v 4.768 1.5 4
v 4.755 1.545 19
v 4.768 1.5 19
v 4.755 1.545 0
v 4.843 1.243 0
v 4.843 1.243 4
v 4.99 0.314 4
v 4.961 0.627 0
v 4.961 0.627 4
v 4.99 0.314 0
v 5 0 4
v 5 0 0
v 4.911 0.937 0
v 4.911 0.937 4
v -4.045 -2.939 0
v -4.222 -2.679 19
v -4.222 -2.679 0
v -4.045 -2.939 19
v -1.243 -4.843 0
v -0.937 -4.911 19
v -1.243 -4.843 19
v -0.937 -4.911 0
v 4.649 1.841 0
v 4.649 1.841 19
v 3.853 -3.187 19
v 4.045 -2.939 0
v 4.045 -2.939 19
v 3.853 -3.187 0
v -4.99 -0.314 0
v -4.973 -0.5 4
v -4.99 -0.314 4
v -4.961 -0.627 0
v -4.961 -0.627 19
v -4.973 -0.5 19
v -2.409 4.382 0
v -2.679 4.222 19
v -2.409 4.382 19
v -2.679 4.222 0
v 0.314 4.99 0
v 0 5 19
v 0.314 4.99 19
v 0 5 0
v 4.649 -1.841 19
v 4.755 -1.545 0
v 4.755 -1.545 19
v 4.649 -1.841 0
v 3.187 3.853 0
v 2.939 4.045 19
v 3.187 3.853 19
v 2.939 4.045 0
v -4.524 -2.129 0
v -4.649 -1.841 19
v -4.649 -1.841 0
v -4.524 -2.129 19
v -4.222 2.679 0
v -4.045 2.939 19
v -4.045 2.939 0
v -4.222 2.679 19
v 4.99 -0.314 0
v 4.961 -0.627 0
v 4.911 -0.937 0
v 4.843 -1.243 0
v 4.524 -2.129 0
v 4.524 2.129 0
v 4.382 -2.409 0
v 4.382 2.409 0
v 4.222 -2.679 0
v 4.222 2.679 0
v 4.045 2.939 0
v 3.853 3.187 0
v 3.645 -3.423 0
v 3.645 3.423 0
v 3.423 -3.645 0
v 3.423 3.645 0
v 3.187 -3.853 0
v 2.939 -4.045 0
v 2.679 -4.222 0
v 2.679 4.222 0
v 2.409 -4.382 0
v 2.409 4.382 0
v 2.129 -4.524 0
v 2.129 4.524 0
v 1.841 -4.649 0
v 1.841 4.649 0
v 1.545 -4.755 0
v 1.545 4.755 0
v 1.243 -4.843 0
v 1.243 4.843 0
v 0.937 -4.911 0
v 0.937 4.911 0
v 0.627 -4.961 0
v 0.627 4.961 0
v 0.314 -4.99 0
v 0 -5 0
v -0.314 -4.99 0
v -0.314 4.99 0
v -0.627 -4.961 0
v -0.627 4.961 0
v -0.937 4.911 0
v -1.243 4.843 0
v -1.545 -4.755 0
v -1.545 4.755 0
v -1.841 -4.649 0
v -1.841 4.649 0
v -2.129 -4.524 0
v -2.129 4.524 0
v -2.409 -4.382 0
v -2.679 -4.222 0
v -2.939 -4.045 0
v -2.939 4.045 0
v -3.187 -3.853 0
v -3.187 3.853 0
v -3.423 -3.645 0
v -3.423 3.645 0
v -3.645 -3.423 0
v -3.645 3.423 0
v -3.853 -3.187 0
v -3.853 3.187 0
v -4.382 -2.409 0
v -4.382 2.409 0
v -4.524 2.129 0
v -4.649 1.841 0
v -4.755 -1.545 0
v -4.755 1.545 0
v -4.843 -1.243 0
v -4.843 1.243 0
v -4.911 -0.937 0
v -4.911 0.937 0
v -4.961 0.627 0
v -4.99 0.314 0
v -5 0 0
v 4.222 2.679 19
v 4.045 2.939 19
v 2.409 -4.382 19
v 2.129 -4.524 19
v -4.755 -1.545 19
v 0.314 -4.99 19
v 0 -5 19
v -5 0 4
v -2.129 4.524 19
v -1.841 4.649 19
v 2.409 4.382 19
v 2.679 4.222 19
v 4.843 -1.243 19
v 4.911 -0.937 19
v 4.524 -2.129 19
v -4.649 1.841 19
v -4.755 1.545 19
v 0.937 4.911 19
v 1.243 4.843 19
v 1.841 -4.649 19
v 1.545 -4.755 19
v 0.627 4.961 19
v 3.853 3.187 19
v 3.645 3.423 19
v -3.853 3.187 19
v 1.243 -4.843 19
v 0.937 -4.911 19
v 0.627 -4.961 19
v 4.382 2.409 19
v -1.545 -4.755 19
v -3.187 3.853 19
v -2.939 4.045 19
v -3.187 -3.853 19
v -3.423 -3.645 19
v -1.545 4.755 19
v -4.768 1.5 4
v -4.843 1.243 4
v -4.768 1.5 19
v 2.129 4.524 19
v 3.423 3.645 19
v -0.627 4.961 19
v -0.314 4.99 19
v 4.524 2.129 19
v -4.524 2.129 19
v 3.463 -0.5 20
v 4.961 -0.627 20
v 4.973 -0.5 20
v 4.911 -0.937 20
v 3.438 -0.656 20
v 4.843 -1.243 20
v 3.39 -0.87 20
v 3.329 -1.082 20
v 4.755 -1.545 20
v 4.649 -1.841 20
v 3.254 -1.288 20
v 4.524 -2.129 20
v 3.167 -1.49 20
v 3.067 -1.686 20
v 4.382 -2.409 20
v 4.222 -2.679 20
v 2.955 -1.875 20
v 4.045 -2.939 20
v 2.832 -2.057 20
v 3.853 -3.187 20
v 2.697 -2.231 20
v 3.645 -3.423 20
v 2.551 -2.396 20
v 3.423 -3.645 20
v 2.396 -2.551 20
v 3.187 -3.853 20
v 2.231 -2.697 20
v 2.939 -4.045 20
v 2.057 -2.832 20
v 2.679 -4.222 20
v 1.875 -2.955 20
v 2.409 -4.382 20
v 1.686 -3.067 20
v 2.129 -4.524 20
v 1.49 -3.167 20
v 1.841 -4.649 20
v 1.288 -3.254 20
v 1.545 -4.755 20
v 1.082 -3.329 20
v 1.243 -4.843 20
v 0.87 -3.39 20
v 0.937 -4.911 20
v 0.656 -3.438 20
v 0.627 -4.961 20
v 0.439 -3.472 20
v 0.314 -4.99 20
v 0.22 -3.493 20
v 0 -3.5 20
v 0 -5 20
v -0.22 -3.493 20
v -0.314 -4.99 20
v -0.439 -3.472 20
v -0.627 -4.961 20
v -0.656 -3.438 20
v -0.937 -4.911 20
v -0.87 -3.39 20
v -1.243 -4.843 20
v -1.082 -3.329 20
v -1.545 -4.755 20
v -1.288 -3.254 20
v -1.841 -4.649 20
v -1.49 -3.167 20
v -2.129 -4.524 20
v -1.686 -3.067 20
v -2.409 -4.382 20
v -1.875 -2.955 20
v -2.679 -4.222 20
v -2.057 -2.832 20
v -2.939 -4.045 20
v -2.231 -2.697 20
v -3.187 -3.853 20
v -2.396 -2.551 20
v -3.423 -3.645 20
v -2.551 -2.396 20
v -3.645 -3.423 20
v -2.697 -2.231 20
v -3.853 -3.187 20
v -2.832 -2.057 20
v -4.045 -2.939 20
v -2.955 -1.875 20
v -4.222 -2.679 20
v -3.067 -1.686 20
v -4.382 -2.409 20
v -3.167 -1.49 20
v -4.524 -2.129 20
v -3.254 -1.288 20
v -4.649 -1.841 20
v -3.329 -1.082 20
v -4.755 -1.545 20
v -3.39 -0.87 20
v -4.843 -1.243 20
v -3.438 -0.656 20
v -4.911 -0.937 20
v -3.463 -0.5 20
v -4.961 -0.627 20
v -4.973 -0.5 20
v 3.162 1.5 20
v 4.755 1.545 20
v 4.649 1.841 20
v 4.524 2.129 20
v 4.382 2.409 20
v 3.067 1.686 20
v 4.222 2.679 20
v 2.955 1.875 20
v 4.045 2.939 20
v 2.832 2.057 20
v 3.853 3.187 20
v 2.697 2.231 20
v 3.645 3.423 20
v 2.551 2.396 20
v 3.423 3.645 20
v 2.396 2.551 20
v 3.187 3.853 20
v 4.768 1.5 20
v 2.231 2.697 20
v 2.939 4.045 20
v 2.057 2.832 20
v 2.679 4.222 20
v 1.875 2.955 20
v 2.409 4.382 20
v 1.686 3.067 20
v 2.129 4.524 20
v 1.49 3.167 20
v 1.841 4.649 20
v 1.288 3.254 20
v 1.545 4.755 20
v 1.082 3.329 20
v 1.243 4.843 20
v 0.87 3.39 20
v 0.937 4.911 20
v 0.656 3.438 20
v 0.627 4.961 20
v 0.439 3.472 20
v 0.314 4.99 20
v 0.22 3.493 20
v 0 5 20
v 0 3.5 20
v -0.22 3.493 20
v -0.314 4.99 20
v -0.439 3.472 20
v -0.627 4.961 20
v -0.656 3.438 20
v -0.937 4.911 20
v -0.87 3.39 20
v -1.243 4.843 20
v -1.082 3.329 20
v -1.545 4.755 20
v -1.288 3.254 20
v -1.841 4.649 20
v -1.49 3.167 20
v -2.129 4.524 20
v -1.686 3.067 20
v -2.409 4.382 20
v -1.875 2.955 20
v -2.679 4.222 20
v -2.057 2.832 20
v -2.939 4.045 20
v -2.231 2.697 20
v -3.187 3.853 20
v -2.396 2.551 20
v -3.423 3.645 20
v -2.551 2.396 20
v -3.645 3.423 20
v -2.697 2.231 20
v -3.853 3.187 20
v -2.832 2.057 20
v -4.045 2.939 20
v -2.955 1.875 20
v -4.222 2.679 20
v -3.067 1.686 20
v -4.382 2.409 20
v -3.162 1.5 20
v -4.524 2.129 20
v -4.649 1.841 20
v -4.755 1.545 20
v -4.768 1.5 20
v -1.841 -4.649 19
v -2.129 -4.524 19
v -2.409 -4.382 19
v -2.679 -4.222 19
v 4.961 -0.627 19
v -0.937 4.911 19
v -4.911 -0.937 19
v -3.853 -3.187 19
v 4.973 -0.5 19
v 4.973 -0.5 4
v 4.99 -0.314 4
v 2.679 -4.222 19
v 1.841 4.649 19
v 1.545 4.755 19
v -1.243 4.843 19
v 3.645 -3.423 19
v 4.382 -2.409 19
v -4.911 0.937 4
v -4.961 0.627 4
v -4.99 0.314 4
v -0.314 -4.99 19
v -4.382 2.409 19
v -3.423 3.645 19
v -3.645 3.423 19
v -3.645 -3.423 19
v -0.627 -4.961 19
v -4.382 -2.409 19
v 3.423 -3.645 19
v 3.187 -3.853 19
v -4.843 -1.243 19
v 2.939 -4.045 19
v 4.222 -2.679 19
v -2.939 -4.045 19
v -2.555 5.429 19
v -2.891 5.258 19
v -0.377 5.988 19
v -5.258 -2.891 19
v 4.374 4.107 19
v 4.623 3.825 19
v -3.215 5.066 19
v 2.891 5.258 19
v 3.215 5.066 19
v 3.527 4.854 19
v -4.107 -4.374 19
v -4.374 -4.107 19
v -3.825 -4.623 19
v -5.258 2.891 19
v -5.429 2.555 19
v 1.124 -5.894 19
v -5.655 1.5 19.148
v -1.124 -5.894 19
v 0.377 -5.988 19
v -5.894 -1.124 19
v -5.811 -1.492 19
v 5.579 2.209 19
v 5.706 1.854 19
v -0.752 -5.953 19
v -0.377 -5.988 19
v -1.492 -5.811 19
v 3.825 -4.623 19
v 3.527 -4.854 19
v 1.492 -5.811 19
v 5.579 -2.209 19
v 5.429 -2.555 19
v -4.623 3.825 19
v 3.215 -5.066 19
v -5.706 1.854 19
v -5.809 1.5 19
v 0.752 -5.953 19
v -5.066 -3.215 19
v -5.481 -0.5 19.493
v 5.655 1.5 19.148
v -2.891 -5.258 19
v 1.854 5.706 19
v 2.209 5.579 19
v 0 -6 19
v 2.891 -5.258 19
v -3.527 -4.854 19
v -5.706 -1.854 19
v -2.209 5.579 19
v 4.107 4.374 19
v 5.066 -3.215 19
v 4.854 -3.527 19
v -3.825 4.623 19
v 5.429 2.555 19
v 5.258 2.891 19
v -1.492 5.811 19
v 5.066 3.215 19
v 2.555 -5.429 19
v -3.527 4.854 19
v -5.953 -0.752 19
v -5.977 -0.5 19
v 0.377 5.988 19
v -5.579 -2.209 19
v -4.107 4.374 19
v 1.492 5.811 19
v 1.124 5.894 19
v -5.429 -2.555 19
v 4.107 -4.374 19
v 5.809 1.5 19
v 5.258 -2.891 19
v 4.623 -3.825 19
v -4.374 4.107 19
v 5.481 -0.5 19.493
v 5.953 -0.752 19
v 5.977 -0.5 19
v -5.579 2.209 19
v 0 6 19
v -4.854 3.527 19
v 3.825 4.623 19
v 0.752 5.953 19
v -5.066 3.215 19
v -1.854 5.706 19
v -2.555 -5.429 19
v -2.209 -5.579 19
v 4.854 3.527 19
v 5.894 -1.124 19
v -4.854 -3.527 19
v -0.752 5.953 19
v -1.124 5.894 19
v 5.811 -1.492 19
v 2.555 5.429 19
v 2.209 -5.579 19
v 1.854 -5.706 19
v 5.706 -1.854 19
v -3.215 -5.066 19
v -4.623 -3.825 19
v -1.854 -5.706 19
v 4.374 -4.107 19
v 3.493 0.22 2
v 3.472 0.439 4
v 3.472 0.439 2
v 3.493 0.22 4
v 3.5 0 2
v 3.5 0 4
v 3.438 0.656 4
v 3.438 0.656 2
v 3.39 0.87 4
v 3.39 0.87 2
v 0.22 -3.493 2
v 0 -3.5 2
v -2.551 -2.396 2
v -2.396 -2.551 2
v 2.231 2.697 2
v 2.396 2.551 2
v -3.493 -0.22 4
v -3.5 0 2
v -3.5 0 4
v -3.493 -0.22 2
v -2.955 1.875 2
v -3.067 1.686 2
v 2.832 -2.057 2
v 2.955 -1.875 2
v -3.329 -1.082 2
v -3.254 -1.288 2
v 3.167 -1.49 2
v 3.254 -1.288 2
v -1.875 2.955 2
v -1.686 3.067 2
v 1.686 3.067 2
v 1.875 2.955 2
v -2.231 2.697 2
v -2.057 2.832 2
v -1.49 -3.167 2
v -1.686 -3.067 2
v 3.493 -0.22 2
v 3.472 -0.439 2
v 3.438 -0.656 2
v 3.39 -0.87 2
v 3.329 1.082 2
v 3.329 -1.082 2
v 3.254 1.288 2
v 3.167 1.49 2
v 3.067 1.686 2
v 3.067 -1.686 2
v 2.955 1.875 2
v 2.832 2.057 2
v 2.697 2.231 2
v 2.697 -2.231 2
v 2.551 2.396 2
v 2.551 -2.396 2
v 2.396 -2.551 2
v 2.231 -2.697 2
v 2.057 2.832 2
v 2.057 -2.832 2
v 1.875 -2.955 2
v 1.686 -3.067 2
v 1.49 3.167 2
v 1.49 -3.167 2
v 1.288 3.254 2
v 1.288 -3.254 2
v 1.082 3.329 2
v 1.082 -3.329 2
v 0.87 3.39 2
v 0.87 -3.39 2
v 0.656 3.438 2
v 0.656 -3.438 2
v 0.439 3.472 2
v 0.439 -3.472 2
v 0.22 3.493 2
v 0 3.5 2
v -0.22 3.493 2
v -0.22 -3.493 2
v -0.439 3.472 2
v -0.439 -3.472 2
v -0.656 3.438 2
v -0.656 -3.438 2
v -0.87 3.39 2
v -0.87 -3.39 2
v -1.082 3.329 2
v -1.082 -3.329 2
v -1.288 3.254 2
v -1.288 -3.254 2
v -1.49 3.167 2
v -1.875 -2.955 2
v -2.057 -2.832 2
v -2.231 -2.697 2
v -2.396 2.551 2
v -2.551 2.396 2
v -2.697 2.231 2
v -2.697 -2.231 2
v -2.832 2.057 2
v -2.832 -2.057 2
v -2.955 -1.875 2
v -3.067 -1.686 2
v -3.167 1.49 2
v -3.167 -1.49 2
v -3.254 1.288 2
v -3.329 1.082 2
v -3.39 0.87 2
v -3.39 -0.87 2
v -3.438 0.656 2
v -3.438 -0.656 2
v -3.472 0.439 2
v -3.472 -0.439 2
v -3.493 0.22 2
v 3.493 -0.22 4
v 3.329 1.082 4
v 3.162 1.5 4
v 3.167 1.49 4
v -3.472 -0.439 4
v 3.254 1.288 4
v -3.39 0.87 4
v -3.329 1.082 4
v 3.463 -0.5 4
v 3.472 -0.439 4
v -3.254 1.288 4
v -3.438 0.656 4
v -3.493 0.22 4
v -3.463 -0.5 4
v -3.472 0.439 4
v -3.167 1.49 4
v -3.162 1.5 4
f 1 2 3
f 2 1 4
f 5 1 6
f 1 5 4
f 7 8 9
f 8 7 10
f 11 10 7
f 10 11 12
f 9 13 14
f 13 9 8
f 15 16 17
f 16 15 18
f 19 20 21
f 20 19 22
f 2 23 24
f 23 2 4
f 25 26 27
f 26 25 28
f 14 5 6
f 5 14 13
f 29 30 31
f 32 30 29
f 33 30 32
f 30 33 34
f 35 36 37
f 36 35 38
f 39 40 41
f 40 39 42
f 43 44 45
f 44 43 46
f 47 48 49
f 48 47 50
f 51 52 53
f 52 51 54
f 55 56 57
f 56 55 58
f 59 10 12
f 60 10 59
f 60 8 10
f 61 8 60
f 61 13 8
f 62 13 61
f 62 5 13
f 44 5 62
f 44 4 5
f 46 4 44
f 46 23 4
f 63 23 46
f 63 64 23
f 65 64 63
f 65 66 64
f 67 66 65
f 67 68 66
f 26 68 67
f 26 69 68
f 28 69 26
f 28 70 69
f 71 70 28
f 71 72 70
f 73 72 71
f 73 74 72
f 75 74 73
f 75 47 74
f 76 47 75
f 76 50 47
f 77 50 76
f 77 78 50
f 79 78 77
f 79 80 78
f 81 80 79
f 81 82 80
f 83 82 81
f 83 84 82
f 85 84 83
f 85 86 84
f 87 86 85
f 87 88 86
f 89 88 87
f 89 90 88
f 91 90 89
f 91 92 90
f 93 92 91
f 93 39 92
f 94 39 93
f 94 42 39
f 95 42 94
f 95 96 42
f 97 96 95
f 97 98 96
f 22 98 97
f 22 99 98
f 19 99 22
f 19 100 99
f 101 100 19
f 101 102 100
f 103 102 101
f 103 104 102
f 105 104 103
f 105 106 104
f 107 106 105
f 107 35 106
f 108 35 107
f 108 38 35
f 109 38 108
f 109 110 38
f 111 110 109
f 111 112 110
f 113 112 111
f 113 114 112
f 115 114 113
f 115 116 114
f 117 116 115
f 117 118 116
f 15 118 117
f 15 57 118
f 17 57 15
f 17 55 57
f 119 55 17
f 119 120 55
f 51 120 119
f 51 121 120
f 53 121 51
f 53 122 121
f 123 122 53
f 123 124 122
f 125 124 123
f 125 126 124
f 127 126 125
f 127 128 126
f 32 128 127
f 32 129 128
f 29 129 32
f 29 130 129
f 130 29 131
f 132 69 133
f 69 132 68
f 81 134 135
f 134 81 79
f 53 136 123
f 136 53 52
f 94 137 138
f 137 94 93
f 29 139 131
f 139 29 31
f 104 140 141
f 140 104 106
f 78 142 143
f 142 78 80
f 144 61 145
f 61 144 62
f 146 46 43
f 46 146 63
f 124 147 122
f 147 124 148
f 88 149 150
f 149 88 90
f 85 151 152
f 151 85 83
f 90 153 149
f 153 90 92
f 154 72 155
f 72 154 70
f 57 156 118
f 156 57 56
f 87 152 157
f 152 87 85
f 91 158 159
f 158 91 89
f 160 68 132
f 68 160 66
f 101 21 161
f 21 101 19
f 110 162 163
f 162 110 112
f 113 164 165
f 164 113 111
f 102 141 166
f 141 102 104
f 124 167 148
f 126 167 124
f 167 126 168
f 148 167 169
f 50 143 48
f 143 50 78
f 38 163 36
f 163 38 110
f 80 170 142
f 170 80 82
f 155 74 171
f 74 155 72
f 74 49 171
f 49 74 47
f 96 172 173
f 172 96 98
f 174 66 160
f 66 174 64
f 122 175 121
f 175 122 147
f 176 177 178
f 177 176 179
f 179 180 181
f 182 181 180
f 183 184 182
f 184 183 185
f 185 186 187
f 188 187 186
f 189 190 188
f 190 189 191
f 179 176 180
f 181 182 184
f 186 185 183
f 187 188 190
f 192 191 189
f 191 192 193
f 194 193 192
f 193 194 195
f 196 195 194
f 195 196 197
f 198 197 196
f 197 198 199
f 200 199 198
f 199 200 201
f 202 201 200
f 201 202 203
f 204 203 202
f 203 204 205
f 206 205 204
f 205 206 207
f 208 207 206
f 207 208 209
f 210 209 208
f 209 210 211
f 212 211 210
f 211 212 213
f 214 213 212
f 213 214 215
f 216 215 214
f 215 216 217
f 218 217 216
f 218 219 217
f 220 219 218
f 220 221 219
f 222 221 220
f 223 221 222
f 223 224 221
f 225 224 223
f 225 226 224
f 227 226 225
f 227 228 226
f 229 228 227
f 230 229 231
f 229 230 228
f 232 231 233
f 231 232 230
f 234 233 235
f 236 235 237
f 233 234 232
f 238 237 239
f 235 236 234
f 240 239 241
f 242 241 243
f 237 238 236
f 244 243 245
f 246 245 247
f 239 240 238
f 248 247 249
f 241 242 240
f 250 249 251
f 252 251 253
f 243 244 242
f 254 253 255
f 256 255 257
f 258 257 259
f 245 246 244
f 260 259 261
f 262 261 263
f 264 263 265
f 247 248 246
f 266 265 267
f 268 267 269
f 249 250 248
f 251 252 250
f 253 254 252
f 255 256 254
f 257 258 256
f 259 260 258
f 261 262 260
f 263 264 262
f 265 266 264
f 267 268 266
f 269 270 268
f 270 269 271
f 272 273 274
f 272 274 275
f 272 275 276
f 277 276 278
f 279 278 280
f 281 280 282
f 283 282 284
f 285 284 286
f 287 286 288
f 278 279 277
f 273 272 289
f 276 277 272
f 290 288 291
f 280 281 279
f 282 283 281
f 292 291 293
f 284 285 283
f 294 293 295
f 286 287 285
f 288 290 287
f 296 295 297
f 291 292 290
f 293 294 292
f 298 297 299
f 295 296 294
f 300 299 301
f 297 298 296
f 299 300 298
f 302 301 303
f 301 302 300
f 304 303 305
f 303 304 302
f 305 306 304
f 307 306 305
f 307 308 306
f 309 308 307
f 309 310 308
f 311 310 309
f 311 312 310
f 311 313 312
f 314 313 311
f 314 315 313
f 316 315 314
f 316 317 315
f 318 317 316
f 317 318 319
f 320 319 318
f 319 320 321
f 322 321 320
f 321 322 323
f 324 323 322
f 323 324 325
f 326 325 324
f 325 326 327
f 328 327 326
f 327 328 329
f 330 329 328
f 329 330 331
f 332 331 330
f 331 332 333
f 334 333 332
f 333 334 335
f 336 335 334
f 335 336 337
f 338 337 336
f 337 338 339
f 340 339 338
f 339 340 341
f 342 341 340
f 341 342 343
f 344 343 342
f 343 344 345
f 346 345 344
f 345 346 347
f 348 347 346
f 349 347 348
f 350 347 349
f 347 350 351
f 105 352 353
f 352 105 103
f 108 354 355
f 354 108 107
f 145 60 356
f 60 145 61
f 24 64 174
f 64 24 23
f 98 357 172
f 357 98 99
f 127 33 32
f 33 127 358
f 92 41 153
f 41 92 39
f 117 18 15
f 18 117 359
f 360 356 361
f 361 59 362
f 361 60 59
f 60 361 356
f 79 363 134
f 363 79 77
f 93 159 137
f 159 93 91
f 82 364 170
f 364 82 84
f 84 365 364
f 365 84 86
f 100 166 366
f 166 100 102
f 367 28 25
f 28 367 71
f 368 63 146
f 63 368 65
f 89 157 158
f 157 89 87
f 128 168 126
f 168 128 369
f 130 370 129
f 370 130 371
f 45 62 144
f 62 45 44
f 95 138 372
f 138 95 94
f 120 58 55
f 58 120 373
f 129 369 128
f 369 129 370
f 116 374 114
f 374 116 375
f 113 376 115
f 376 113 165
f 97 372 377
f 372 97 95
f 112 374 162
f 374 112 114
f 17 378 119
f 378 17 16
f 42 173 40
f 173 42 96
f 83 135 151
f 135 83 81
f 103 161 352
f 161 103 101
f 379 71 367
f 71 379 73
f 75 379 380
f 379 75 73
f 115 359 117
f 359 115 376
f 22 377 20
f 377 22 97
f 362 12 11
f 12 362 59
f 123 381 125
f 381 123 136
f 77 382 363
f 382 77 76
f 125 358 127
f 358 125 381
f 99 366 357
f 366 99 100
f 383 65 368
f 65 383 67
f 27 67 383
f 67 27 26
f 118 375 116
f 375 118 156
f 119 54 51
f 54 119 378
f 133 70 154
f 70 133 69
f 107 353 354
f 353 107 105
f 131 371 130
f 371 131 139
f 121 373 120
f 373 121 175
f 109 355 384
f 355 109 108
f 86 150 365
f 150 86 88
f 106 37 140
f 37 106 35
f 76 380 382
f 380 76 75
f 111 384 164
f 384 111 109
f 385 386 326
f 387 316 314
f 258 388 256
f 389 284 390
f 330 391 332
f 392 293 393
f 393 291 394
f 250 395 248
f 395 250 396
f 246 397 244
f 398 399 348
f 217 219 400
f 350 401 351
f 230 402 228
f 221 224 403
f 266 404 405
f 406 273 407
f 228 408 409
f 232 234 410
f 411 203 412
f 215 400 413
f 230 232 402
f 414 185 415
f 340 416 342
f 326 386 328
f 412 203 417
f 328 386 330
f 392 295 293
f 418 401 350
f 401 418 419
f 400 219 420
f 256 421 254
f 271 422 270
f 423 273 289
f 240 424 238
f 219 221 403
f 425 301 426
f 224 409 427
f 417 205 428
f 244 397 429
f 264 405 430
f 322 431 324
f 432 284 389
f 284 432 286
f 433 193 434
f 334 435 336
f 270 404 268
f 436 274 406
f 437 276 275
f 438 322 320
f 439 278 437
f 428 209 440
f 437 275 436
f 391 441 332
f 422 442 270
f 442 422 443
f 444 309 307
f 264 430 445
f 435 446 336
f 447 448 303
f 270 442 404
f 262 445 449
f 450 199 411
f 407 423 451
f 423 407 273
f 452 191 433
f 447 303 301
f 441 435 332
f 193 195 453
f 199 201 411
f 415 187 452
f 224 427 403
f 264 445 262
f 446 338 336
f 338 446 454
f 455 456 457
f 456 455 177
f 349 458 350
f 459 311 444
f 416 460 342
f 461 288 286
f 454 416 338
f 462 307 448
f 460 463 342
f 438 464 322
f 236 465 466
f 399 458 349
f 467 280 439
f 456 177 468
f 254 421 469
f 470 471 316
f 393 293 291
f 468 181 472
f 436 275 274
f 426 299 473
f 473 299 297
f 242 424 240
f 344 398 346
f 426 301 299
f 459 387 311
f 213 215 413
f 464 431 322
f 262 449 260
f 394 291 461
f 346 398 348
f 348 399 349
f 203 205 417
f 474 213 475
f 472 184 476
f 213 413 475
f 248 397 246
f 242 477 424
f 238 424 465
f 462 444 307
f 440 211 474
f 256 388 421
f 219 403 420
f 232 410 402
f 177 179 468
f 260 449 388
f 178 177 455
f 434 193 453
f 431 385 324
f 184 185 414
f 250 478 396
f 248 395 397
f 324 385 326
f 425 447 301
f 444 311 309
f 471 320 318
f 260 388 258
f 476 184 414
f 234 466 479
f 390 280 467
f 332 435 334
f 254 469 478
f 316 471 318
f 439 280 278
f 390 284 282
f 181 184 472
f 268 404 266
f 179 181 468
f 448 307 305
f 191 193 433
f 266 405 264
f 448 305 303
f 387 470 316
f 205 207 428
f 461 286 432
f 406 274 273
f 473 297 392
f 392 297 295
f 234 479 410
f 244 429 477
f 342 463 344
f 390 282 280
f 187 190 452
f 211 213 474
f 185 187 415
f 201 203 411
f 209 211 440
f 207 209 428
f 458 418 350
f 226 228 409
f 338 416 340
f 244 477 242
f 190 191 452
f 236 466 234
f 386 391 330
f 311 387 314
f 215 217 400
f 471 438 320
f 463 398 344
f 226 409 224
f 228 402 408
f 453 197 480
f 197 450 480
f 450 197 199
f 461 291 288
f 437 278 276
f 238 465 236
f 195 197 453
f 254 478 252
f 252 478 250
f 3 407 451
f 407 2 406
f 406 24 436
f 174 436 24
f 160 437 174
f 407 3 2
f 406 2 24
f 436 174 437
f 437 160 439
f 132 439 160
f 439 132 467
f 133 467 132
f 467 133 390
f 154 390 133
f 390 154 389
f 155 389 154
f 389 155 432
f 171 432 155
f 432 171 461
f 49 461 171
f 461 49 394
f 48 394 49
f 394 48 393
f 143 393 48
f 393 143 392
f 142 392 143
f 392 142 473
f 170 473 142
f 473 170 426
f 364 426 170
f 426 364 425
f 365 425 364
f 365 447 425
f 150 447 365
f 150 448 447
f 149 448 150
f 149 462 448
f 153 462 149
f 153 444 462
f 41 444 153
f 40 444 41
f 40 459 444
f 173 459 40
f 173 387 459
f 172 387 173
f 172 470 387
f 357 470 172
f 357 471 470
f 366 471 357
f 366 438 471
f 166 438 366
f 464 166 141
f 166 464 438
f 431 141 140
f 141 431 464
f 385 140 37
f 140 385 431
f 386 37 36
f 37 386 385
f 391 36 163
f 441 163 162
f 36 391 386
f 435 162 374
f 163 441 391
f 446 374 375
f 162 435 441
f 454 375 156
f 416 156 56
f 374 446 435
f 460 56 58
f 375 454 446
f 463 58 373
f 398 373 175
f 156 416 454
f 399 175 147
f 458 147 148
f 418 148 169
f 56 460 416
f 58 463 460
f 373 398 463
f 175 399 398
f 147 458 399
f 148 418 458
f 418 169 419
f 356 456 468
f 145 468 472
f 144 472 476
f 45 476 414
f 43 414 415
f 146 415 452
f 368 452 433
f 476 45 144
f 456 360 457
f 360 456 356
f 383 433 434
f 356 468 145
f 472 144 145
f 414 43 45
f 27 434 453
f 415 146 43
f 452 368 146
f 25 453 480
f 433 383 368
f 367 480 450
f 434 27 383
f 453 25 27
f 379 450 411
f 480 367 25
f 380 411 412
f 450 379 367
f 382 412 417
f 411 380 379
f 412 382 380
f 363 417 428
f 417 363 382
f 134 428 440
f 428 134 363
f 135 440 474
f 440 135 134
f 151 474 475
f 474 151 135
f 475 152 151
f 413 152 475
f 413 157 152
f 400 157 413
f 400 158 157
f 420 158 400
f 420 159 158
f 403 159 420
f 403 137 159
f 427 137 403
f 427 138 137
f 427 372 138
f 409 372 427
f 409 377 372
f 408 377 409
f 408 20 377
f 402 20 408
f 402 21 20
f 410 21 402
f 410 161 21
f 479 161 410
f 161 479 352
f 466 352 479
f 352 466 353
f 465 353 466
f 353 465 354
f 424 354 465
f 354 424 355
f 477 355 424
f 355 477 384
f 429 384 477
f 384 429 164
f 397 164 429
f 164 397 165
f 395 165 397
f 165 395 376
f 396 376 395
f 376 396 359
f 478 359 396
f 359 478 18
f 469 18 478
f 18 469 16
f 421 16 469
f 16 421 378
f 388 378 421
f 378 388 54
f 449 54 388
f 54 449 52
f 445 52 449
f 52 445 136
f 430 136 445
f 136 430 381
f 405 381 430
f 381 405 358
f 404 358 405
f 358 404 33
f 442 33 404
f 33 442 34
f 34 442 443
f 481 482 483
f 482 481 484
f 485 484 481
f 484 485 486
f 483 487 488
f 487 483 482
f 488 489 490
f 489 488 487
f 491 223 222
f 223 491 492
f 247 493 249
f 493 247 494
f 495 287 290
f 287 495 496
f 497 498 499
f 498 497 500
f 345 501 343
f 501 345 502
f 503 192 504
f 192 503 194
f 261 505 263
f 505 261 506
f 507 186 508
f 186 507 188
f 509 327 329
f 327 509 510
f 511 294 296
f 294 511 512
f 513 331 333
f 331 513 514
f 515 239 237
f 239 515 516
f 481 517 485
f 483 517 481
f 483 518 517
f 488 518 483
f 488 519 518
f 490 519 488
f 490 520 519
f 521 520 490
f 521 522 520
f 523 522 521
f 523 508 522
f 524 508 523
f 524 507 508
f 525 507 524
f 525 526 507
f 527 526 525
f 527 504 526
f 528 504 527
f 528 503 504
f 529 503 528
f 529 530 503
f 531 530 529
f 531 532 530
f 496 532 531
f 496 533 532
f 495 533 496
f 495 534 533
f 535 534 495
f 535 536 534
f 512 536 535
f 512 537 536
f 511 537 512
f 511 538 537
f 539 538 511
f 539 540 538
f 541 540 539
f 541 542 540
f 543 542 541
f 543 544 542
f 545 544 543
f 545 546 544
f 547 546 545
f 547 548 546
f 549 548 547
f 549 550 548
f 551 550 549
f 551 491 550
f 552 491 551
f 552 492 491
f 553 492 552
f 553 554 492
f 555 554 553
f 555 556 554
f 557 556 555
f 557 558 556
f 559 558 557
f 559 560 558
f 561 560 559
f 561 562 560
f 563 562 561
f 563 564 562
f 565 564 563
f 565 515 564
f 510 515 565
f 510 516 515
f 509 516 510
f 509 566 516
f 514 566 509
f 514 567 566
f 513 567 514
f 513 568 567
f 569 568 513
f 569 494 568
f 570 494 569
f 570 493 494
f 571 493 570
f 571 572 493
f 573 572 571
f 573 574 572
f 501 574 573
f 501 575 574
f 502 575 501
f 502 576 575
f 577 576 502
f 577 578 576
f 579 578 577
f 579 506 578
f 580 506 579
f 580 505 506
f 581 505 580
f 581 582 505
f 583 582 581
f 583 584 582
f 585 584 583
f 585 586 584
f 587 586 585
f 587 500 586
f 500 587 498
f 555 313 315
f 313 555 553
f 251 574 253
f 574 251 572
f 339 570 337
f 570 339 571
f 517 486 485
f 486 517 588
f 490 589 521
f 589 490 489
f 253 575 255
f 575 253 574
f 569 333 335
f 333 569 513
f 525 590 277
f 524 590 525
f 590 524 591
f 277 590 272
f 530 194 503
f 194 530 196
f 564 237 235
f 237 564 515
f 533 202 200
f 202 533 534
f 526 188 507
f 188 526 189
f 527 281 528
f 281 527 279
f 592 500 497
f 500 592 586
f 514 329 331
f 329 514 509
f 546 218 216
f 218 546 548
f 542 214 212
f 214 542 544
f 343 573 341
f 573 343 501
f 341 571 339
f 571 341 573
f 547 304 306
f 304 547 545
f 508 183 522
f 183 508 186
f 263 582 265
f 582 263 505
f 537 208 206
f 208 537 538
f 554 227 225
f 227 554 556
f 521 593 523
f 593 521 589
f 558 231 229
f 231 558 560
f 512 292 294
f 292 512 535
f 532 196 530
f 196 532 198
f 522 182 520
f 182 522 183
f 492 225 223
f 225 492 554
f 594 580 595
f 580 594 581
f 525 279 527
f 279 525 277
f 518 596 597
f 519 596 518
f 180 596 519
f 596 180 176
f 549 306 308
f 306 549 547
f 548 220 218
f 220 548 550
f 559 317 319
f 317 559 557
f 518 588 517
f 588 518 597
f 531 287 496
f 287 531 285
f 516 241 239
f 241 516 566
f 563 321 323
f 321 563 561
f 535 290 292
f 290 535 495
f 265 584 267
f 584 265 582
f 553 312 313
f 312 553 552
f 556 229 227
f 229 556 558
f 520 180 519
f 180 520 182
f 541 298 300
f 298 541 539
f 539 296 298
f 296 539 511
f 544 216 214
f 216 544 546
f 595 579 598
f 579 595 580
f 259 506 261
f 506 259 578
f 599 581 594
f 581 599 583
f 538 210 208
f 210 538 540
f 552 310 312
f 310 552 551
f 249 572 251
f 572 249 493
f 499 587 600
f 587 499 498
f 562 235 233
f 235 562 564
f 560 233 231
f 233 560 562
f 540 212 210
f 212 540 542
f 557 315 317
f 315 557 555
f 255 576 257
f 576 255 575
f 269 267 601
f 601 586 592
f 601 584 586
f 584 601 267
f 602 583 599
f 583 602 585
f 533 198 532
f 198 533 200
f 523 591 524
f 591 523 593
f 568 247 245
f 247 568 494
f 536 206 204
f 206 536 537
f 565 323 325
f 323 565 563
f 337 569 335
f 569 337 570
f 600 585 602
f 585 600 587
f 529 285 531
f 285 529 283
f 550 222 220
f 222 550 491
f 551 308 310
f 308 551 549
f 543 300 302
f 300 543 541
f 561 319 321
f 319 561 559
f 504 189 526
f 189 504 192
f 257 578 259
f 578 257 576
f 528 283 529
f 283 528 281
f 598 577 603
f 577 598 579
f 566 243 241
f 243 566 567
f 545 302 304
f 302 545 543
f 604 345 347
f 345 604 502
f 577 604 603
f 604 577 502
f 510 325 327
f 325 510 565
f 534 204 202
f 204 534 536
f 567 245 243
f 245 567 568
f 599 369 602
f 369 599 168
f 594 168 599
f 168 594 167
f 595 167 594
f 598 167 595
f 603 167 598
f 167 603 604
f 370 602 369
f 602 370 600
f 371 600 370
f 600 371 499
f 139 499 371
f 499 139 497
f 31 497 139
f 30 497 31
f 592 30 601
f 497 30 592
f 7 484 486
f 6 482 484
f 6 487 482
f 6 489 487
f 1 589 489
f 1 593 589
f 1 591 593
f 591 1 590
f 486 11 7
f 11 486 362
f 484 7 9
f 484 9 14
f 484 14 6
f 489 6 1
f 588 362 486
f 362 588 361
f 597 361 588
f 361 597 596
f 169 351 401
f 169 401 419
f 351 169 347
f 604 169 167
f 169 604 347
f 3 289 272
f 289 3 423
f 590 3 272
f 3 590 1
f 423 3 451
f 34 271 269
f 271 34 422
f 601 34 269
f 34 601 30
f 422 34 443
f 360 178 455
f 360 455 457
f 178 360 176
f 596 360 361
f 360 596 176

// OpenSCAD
$fn=100;

clip(20,5);

module clip(clipLength,clipRadius){
	
	difference(){
		union() {

			cylinder(clipLength,clipRadius, clipRadius);

			translate([0,0,clipLength-1]){
				cylinder(1,clipRadius +1, clipRadius);
			}
		}

		translate([0,0,0.1*clipLength]){
			cylinder(clipLength*2,clipRadius*0.7, clipRadius*0.7);
		}

		translate([-(clipRadius*1.5 ),-1/2,0.2*clipLength]){
			cube([clipRadius*3,2,clipLength*2]);
		}
	}
}
